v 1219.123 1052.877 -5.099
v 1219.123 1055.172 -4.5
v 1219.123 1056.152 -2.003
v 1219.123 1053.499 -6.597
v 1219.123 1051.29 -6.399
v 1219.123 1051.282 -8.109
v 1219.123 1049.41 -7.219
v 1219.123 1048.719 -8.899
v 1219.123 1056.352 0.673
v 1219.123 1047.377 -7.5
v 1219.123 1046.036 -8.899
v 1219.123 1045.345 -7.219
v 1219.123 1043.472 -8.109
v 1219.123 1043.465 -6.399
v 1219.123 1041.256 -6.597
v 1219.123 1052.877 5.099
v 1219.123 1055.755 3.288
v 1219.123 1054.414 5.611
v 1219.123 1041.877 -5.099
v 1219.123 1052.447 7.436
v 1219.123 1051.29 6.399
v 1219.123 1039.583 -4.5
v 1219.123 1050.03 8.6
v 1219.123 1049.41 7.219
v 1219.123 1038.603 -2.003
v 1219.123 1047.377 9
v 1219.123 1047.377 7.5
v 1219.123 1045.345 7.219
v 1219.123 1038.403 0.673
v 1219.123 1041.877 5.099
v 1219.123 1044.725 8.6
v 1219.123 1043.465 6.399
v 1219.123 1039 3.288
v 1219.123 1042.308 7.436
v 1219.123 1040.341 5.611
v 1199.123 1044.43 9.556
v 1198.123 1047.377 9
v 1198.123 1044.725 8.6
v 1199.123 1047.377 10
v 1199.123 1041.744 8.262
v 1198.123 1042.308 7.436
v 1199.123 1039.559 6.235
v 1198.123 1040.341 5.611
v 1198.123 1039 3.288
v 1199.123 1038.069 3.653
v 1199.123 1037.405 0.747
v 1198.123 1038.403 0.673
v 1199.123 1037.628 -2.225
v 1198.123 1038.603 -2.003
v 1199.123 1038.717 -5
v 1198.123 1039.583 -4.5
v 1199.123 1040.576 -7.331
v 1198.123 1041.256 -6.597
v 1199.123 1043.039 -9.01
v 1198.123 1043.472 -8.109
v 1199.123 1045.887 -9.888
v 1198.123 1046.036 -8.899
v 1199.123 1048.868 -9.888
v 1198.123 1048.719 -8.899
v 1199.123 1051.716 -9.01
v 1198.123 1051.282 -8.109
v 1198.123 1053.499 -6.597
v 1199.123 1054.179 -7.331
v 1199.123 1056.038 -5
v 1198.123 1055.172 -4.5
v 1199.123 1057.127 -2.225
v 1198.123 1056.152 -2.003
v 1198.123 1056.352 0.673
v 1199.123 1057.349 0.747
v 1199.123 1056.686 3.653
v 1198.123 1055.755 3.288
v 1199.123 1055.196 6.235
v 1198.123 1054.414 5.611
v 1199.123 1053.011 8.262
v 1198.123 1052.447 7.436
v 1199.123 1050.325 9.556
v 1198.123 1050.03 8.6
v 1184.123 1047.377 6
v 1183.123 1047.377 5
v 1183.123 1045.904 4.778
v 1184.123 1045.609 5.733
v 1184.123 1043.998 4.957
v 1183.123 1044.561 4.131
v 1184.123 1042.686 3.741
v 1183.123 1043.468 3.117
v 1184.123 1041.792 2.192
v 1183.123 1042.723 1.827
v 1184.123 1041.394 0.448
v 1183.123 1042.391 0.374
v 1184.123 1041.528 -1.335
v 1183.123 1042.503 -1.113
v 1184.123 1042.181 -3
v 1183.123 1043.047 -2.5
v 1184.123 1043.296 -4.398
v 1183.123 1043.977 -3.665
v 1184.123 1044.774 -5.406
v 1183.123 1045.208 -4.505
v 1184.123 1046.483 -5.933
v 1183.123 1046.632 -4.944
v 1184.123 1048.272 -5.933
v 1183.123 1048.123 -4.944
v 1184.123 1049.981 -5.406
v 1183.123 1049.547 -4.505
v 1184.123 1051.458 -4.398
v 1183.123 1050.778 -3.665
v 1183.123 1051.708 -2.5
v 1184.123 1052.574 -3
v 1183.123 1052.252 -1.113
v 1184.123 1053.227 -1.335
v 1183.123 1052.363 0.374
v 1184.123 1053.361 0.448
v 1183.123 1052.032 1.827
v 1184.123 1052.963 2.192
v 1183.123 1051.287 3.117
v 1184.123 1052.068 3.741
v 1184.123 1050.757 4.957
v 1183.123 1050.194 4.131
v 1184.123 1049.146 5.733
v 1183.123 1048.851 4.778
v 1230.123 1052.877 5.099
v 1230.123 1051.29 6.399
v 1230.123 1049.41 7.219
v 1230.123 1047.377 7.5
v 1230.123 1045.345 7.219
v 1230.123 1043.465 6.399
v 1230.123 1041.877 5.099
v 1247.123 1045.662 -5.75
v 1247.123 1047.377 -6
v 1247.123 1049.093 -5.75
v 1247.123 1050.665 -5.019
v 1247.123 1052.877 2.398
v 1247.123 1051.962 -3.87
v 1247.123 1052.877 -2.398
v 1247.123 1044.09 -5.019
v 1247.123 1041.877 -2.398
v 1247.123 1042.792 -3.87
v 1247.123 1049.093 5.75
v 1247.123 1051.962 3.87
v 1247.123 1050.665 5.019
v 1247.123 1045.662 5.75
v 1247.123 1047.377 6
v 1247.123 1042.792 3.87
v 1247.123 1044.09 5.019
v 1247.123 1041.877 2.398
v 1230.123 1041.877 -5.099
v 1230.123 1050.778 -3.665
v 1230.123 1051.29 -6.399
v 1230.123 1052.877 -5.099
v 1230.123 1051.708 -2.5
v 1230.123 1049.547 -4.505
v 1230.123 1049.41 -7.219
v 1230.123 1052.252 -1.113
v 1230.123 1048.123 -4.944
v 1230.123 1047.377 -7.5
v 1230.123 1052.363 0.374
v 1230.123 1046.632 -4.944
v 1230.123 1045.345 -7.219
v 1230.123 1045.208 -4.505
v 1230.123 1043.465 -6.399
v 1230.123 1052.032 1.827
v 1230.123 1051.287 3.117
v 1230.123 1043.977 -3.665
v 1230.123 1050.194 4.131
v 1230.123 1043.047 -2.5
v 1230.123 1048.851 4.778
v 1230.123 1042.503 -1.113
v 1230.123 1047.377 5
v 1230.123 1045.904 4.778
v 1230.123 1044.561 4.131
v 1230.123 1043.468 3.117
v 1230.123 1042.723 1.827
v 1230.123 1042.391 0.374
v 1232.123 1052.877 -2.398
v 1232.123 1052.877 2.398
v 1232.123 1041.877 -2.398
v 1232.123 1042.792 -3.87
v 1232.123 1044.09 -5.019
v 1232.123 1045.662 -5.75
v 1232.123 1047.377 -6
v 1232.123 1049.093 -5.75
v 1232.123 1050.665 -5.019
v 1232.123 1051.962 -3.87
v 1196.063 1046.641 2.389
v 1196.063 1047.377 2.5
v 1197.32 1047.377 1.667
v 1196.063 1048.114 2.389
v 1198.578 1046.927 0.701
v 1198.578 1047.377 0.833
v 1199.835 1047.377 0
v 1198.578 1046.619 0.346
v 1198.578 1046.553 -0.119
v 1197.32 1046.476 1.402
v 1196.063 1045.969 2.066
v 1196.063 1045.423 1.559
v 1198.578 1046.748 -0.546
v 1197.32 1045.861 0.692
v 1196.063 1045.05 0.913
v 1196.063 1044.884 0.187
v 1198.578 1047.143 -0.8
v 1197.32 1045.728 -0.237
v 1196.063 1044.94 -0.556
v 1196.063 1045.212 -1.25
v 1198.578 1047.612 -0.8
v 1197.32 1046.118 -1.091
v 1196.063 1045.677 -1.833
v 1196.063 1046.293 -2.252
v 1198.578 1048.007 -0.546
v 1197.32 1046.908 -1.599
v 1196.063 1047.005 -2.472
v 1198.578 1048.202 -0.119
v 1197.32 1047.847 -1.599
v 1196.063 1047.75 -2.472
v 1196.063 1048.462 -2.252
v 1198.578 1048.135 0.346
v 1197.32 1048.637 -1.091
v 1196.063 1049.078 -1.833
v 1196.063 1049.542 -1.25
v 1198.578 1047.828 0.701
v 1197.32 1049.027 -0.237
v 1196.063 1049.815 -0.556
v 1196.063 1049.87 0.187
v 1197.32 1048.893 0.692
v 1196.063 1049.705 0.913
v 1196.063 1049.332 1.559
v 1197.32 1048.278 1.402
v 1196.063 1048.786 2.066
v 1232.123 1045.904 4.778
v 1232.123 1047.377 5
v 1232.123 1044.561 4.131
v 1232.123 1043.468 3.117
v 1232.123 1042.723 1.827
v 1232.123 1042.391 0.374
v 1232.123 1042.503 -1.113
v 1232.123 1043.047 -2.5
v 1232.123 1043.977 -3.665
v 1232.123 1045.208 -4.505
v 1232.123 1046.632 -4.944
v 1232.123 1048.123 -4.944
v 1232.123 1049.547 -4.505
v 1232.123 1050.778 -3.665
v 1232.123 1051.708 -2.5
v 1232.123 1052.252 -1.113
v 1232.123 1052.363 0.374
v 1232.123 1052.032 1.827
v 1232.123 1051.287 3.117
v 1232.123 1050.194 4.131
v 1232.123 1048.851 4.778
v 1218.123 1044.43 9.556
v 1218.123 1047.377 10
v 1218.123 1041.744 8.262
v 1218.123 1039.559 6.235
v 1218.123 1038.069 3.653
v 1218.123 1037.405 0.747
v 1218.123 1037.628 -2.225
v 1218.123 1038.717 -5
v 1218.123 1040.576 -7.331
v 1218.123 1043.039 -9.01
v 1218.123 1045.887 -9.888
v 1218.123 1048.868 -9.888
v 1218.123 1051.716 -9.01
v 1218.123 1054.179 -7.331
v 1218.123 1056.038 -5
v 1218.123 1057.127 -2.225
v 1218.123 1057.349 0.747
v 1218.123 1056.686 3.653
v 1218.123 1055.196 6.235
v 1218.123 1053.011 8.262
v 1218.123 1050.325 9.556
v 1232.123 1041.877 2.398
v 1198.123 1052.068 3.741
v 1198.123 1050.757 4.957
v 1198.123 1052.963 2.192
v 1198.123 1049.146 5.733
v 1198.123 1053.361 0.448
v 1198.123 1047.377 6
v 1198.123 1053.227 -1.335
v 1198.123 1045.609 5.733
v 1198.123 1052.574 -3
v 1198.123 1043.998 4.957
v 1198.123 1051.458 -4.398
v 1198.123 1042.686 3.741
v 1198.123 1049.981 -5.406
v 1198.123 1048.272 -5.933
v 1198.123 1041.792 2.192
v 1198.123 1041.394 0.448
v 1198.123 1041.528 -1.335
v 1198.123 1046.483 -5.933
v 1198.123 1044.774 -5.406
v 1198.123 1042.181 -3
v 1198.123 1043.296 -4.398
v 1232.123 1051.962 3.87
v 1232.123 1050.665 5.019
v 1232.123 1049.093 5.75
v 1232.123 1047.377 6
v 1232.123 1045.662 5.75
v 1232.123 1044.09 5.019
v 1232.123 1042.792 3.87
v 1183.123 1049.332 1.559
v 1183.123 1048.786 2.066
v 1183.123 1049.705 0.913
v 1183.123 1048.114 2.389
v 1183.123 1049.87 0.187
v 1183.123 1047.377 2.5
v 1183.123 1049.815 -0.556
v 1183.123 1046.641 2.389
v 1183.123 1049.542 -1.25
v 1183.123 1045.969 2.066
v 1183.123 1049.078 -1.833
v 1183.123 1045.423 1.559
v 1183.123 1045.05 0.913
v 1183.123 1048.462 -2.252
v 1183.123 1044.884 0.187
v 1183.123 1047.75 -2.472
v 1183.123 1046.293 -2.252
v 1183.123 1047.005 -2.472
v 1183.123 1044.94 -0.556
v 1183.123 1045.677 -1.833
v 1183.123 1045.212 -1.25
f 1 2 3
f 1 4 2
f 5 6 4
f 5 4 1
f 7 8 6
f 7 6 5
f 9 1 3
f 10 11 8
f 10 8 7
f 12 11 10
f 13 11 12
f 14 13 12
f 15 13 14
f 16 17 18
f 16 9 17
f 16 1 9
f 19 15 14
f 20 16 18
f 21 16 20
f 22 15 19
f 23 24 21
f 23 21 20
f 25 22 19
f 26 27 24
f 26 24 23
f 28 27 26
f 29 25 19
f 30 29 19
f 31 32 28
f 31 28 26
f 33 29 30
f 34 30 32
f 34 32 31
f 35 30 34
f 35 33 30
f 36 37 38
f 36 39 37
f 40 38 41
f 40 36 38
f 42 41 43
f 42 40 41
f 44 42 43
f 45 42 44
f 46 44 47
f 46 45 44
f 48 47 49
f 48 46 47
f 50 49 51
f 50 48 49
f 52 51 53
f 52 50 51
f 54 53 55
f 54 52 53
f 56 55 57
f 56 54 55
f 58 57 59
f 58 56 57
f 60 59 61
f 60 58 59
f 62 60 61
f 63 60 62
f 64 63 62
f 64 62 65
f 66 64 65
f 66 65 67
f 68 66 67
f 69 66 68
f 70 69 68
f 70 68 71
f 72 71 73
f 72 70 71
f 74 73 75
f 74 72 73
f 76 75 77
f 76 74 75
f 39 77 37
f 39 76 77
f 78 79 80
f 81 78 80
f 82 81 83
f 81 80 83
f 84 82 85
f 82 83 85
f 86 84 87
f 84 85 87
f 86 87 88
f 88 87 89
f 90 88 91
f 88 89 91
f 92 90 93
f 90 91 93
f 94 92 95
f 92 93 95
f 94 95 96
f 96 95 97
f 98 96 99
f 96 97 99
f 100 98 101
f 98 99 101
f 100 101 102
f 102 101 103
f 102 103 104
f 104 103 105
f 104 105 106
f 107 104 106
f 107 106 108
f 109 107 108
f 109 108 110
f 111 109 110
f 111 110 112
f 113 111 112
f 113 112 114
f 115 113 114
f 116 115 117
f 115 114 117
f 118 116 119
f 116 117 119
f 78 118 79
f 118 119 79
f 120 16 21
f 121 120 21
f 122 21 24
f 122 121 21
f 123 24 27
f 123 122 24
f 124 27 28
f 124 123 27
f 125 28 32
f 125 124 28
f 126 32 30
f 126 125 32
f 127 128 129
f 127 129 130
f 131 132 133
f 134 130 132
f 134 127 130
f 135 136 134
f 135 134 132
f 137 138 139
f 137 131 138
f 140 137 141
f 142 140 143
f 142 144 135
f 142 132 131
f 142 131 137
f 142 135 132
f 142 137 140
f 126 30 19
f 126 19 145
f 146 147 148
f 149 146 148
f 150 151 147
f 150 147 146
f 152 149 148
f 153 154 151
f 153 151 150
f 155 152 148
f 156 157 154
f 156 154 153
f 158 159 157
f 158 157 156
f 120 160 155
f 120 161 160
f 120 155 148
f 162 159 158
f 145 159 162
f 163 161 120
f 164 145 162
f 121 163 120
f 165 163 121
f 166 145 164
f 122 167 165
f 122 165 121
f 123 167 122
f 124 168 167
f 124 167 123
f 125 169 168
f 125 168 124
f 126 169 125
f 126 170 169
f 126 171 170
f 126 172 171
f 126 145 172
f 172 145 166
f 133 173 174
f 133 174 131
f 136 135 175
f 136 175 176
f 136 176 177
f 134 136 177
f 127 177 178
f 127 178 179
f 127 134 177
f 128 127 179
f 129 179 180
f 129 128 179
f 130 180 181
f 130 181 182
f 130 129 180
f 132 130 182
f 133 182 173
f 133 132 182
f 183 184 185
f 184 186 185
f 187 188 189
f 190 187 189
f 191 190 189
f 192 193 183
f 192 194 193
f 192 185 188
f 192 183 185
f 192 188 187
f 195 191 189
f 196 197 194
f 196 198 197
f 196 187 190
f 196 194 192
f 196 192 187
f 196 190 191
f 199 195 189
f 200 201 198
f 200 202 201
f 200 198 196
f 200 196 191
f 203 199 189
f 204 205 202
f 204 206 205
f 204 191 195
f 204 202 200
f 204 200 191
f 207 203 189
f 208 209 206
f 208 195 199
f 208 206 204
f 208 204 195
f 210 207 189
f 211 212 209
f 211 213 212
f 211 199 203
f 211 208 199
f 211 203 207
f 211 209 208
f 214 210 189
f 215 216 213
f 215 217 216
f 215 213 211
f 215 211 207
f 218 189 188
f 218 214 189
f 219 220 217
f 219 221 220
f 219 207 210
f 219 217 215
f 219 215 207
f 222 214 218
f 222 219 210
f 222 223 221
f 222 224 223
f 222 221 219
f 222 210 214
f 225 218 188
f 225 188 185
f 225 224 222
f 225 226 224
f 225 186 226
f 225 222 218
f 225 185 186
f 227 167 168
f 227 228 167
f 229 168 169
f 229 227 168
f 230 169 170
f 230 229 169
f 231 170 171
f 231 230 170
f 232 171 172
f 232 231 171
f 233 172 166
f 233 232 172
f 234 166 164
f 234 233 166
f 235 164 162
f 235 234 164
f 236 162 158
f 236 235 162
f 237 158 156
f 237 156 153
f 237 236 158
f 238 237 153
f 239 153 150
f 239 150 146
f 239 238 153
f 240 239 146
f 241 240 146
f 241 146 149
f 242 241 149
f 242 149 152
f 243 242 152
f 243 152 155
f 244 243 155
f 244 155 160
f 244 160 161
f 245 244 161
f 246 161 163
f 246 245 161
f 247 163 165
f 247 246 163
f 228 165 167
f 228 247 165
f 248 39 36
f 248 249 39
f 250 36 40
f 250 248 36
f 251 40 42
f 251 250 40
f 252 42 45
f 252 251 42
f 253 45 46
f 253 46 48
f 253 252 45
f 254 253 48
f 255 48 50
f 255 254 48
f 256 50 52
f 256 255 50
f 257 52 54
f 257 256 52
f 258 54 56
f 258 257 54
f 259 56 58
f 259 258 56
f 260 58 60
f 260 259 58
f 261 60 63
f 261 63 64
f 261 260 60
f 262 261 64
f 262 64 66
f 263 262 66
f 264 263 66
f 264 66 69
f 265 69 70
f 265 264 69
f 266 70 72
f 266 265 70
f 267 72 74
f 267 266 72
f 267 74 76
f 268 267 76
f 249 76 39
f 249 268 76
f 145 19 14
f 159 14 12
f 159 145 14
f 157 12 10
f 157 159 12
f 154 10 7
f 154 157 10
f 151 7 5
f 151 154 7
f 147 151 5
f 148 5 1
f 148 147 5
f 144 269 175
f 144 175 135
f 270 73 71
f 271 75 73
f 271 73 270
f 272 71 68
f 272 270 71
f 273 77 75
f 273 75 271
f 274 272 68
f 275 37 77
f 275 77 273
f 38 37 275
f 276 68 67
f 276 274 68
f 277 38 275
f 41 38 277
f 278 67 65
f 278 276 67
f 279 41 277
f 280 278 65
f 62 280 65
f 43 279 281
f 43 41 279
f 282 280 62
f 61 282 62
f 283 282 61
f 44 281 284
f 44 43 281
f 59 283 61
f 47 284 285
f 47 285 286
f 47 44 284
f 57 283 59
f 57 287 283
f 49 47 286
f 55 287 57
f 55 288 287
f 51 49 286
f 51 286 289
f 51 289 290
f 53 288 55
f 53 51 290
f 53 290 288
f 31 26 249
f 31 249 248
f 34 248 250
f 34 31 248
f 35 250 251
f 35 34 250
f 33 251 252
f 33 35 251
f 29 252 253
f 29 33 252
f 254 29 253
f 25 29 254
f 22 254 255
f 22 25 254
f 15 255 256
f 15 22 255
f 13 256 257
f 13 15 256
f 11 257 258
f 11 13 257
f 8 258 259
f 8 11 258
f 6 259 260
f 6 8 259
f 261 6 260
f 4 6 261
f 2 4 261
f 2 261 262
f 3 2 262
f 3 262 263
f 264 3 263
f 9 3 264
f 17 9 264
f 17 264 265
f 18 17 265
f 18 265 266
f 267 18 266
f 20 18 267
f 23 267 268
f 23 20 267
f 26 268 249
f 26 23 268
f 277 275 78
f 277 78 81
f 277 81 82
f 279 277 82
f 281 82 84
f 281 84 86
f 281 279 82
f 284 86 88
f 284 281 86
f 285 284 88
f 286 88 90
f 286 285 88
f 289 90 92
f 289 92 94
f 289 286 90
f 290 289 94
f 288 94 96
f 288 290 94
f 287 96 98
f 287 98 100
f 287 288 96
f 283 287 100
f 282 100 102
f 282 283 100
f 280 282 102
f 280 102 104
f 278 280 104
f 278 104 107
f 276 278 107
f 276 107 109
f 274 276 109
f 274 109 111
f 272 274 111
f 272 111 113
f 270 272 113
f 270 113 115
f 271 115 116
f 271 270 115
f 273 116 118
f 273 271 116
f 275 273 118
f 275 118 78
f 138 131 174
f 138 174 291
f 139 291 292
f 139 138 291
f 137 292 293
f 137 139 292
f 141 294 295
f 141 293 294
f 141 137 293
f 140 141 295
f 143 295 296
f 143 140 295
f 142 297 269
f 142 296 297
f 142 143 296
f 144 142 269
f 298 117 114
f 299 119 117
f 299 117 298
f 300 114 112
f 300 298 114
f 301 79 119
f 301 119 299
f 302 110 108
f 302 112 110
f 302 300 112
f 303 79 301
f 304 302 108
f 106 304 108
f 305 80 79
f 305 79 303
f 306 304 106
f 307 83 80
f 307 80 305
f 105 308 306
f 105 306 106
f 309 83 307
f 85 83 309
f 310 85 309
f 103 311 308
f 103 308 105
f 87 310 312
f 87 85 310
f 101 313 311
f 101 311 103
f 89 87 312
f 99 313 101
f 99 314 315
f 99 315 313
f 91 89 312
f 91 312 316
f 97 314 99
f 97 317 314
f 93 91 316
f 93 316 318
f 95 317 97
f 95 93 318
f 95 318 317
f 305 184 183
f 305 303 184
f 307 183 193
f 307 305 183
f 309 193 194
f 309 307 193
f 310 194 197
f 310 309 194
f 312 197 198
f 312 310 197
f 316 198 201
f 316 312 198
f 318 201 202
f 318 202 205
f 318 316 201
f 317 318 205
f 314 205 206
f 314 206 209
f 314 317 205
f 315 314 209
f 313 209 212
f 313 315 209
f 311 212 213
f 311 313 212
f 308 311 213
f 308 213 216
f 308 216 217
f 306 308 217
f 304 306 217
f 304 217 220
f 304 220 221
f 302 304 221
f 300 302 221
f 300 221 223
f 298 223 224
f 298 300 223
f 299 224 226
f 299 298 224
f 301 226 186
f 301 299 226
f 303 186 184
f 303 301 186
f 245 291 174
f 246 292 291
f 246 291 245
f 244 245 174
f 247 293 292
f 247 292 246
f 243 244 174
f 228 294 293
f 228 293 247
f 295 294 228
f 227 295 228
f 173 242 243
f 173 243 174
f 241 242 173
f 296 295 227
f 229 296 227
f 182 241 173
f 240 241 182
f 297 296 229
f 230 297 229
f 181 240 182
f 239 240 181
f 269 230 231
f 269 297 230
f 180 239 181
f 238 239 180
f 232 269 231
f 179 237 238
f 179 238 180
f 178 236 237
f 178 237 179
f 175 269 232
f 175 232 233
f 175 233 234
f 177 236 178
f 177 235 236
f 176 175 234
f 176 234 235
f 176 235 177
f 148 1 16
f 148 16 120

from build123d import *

# Parameters (mm, degrees)
CHAMFER_1_SIZE      = 1
SKETCH_6_W          = 32.162654491
SKETCH_6_H          = 6.23657893
SKETCH_6_H_2        = 6.236578929
CUT_EXTRUDE_1_DEPTH = 25


with BuildPart() as part:
    # 草图1 → 旋转6 (revolve)
    with BuildSketch(Plane.XY, mode=Mode.PRIVATE) as revolve_6_sk:
        Polygon((1183.122729102, 1053.377429506), (1198.122729102, 1053.377429506), (1198.122729102, 1056.377429506), (1199.122729102, 1057.377429506), (1218.122729102, 1057.377429506), (1219.122729102, 1056.377429506), (1219.122729102, 1054.877429506), (1230.122729102, 1054.877429506), (1230.122729102, 1052.377429506), (1232.122729102, 1052.377429506), (1232.122729102, 1053.377429506), (1247.122729102, 1053.377429506), (1247.122729102, 1047.377429506), (1199.835322309, 1047.377429506), (1196.062603927, 1049.877429506), (1183.122729102, 1049.877429506), align=None)
    revolve(revolve_6_sk.sketch.rotate(Axis((1180.708635967, 1047.377429506, 0), (1, 0, 0)), 90), axis=Axis((1180.708635967, 1047.377429506, 0), (1, 0, 0)))

    # 倒角1
    chamfer_1_edges = [part.edges().sort_by_distance(p)[0] for p in [
        (1183.122729102, 1047.377429506, -6),
    ]]
    chamfer(chamfer_1_edges, length=CHAMFER_1_SIZE)

    # 草图6 → 拉伸1 (cut, symmetric)
    with BuildSketch(Plane.XY):
        with Locations((1235.204056347, 1055.995718971)):
            Rectangle(SKETCH_6_W, SKETCH_6_H)
        with Locations((1235.204056347, 1038.759140041)):
            Rectangle(SKETCH_6_W, SKETCH_6_H_2)
    extrude(amount=CUT_EXTRUDE_1_DEPTH, both=True, mode=Mode.SUBTRACT)


solid = part.part
